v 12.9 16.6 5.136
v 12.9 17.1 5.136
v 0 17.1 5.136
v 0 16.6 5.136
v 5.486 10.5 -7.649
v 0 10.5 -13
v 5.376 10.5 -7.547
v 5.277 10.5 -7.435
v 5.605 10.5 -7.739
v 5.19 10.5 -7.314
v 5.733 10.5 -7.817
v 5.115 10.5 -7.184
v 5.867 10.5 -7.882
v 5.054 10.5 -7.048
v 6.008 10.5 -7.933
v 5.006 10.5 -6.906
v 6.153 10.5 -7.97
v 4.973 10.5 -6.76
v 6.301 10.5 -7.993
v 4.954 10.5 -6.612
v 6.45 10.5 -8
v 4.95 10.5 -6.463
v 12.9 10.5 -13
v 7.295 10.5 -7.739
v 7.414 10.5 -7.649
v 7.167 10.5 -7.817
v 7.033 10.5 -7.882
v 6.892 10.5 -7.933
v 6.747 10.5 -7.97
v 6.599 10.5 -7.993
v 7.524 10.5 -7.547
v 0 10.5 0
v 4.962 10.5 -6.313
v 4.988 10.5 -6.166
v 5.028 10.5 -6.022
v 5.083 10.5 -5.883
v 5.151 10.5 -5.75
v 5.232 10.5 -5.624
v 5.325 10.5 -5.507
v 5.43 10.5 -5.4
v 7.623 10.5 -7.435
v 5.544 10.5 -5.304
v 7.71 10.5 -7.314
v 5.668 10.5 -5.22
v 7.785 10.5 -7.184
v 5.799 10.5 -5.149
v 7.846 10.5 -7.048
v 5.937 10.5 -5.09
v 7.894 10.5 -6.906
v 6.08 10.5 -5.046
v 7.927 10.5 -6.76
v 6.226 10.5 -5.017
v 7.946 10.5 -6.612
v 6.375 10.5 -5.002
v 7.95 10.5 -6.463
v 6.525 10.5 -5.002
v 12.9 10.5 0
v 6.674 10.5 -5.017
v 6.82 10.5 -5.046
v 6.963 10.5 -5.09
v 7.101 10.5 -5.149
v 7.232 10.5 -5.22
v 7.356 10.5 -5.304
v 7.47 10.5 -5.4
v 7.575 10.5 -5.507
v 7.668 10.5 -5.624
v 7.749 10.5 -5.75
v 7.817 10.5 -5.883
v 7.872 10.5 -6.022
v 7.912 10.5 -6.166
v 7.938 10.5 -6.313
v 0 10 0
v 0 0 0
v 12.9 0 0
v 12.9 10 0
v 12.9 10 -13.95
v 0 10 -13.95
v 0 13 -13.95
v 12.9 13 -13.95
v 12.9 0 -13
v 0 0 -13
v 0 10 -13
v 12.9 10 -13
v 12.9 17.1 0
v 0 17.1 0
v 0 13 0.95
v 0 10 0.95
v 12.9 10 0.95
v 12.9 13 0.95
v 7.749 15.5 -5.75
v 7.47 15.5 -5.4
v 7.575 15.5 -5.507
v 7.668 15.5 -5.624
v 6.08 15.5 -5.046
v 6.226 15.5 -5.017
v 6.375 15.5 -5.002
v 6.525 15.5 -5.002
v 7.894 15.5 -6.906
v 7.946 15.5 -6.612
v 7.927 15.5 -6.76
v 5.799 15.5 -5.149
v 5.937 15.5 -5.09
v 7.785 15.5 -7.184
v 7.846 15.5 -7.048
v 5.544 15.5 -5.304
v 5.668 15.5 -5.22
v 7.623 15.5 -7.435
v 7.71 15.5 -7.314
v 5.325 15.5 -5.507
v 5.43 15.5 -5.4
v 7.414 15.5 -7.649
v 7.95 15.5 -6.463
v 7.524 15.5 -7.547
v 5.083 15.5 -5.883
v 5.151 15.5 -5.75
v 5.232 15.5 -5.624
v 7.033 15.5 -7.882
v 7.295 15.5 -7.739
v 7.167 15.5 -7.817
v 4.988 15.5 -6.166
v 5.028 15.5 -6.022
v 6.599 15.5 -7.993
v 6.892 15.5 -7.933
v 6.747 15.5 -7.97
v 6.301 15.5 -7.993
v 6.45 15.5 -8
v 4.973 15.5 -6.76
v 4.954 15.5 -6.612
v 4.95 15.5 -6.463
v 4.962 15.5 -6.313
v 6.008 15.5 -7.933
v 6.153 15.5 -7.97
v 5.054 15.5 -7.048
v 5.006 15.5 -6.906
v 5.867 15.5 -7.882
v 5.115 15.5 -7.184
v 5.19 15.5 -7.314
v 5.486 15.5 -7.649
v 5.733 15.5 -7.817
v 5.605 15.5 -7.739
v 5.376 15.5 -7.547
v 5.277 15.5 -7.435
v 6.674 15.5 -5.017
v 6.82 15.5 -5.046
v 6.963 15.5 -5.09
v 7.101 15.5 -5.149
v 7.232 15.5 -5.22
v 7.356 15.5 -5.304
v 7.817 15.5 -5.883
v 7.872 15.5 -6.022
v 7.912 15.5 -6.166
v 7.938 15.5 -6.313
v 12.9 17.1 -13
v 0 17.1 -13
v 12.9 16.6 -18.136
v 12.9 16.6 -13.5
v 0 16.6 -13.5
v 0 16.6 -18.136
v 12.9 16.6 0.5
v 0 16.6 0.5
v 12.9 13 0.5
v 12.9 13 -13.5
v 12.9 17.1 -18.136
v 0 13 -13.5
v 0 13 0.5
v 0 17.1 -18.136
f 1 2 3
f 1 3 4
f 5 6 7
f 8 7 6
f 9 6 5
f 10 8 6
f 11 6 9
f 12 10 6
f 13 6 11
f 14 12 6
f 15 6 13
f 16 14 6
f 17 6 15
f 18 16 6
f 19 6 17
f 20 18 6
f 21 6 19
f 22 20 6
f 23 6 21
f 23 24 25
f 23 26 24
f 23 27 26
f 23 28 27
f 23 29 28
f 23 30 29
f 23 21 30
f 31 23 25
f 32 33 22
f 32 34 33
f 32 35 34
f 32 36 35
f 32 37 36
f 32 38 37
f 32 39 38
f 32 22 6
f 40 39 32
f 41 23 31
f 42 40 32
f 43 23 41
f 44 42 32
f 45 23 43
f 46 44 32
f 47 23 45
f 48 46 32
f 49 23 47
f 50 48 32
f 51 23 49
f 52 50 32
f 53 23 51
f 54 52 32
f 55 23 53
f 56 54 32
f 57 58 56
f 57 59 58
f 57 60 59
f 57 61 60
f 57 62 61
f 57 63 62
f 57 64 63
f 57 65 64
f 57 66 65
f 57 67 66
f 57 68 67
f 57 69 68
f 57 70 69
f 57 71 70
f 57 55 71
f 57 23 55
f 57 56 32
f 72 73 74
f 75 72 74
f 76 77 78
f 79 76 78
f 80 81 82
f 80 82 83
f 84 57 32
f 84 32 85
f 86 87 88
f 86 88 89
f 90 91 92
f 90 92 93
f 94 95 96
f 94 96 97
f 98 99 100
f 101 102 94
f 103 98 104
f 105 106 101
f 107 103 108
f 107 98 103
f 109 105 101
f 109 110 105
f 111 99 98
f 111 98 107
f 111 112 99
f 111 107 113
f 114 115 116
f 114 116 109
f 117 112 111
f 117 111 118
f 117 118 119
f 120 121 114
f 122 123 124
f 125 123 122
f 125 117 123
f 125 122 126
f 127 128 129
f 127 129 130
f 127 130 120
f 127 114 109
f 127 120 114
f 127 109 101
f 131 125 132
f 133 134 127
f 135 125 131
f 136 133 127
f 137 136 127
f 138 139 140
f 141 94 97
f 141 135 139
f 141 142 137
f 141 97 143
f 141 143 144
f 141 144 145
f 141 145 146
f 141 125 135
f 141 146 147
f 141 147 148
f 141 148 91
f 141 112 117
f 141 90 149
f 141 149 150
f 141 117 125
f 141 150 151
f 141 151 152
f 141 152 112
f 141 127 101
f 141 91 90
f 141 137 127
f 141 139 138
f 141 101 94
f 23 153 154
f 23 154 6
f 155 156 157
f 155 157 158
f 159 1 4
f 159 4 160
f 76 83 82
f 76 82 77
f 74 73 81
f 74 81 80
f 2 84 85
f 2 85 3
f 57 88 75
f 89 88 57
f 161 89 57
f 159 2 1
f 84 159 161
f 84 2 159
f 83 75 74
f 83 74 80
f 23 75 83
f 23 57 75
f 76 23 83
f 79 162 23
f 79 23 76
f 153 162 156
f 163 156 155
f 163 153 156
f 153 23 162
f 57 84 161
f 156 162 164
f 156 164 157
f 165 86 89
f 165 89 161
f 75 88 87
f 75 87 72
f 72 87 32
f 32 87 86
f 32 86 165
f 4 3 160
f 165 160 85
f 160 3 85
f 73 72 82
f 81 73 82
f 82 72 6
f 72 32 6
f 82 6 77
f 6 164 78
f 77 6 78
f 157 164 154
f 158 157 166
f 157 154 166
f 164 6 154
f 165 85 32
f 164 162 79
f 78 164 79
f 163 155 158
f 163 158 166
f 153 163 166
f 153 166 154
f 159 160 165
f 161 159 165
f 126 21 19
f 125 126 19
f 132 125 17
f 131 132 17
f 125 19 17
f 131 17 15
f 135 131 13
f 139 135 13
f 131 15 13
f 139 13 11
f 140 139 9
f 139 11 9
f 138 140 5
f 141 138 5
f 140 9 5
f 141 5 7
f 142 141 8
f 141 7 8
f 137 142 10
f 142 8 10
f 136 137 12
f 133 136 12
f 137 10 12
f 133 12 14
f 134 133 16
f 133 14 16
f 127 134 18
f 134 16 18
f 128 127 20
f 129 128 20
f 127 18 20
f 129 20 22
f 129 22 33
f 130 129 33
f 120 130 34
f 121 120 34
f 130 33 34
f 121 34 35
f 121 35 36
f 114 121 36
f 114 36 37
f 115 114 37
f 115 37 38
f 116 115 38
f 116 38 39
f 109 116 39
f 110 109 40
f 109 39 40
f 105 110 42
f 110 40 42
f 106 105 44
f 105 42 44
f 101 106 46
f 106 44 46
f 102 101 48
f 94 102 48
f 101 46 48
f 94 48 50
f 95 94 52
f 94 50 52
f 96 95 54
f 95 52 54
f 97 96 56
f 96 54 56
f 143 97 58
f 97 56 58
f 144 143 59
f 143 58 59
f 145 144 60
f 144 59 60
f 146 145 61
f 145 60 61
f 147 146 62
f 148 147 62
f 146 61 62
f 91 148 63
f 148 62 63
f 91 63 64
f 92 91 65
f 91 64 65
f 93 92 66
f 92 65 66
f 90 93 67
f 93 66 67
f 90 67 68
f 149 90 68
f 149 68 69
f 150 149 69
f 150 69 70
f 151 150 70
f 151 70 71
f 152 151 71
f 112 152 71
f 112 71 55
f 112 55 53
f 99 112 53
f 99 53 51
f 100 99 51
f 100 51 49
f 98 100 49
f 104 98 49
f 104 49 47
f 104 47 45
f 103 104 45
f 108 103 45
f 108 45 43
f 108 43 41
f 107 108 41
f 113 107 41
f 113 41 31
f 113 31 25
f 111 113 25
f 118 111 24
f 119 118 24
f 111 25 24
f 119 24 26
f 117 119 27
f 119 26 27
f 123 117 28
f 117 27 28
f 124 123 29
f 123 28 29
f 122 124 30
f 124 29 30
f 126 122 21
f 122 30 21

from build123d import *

# Parameters (mm, degrees)
SKETCH1_W           = 12.9
SKETCH1_H           = 13
BOSS_EXTRUDE1_DEPTH = 10
BOSS_EXTRUDE2_DEPTH = 12.9
SKETCH3_W           = 0.45
SKETCH3_H           = 3
BOSS_EXTRUDE3_DEPTH = 12.9
SKETCH4_R           = 1.5
BOSS_EXTRUDE4_DEPTH = 5


with BuildPart() as part:
    # Sketch1 → Boss-Extrude1 (new body)
    with BuildSketch(Plane(origin=(0, 0, 0), x_dir=(1, 0, 0), z_dir=(0, 1, 0))):
        with Locations((6.45, 6.5)):
            Rectangle(SKETCH1_W, SKETCH1_H)
    extrude(amount=BOSS_EXTRUDE1_DEPTH)

    # Sketch2 → Boss-Extrude2 (add)
    with BuildSketch(Plane(origin=(12.9, 0, 0), x_dir=(0, 0, -1), z_dir=(1, 0, 0))):
        Polygon((6.5, 10), (6.5, 10.5), (0, 10.5), (0, 17.1), (-5.135999104, 17.1), (-5.135999104, 16.6), (-0.5, 16.6), (-0.5, 10), (0, 10), align=None)
        Polygon((13, 17.1), (13, 10.5), (6.5, 10.5), (6.5, 10), (13, 10), (13.5, 10), (13.5, 16.6), (18.135999104, 16.6), (18.135999104, 17.1), align=None)
    extrude(amount=-BOSS_EXTRUDE2_DEPTH)

    # Sketch3 → Boss-Extrude3 (add)
    with BuildSketch(Plane(origin=(12.9, 0, 0), x_dir=(0, 0, -1), z_dir=(1, 0, 0))):
        with Locations((-0.725, 11.5)):
            Rectangle(SKETCH3_W, SKETCH3_H)
        with Locations((13.725, 11.5)):
            Rectangle(SKETCH3_W, SKETCH3_H)
    extrude(amount=-BOSS_EXTRUDE3_DEPTH)

    # Sketch4 → Boss-Extrude4 (add)
    with BuildSketch(Plane(origin=(0, 10.5, 0), x_dir=(1, 0, 0), z_dir=(0, 1, 0))):
        with Locations(Location((6.45, 6.5, 0), (0, 0, 90))):
            Circle(SKETCH4_R)
    extrude(amount=BOSS_EXTRUDE4_DEPTH)


solid = part.part
